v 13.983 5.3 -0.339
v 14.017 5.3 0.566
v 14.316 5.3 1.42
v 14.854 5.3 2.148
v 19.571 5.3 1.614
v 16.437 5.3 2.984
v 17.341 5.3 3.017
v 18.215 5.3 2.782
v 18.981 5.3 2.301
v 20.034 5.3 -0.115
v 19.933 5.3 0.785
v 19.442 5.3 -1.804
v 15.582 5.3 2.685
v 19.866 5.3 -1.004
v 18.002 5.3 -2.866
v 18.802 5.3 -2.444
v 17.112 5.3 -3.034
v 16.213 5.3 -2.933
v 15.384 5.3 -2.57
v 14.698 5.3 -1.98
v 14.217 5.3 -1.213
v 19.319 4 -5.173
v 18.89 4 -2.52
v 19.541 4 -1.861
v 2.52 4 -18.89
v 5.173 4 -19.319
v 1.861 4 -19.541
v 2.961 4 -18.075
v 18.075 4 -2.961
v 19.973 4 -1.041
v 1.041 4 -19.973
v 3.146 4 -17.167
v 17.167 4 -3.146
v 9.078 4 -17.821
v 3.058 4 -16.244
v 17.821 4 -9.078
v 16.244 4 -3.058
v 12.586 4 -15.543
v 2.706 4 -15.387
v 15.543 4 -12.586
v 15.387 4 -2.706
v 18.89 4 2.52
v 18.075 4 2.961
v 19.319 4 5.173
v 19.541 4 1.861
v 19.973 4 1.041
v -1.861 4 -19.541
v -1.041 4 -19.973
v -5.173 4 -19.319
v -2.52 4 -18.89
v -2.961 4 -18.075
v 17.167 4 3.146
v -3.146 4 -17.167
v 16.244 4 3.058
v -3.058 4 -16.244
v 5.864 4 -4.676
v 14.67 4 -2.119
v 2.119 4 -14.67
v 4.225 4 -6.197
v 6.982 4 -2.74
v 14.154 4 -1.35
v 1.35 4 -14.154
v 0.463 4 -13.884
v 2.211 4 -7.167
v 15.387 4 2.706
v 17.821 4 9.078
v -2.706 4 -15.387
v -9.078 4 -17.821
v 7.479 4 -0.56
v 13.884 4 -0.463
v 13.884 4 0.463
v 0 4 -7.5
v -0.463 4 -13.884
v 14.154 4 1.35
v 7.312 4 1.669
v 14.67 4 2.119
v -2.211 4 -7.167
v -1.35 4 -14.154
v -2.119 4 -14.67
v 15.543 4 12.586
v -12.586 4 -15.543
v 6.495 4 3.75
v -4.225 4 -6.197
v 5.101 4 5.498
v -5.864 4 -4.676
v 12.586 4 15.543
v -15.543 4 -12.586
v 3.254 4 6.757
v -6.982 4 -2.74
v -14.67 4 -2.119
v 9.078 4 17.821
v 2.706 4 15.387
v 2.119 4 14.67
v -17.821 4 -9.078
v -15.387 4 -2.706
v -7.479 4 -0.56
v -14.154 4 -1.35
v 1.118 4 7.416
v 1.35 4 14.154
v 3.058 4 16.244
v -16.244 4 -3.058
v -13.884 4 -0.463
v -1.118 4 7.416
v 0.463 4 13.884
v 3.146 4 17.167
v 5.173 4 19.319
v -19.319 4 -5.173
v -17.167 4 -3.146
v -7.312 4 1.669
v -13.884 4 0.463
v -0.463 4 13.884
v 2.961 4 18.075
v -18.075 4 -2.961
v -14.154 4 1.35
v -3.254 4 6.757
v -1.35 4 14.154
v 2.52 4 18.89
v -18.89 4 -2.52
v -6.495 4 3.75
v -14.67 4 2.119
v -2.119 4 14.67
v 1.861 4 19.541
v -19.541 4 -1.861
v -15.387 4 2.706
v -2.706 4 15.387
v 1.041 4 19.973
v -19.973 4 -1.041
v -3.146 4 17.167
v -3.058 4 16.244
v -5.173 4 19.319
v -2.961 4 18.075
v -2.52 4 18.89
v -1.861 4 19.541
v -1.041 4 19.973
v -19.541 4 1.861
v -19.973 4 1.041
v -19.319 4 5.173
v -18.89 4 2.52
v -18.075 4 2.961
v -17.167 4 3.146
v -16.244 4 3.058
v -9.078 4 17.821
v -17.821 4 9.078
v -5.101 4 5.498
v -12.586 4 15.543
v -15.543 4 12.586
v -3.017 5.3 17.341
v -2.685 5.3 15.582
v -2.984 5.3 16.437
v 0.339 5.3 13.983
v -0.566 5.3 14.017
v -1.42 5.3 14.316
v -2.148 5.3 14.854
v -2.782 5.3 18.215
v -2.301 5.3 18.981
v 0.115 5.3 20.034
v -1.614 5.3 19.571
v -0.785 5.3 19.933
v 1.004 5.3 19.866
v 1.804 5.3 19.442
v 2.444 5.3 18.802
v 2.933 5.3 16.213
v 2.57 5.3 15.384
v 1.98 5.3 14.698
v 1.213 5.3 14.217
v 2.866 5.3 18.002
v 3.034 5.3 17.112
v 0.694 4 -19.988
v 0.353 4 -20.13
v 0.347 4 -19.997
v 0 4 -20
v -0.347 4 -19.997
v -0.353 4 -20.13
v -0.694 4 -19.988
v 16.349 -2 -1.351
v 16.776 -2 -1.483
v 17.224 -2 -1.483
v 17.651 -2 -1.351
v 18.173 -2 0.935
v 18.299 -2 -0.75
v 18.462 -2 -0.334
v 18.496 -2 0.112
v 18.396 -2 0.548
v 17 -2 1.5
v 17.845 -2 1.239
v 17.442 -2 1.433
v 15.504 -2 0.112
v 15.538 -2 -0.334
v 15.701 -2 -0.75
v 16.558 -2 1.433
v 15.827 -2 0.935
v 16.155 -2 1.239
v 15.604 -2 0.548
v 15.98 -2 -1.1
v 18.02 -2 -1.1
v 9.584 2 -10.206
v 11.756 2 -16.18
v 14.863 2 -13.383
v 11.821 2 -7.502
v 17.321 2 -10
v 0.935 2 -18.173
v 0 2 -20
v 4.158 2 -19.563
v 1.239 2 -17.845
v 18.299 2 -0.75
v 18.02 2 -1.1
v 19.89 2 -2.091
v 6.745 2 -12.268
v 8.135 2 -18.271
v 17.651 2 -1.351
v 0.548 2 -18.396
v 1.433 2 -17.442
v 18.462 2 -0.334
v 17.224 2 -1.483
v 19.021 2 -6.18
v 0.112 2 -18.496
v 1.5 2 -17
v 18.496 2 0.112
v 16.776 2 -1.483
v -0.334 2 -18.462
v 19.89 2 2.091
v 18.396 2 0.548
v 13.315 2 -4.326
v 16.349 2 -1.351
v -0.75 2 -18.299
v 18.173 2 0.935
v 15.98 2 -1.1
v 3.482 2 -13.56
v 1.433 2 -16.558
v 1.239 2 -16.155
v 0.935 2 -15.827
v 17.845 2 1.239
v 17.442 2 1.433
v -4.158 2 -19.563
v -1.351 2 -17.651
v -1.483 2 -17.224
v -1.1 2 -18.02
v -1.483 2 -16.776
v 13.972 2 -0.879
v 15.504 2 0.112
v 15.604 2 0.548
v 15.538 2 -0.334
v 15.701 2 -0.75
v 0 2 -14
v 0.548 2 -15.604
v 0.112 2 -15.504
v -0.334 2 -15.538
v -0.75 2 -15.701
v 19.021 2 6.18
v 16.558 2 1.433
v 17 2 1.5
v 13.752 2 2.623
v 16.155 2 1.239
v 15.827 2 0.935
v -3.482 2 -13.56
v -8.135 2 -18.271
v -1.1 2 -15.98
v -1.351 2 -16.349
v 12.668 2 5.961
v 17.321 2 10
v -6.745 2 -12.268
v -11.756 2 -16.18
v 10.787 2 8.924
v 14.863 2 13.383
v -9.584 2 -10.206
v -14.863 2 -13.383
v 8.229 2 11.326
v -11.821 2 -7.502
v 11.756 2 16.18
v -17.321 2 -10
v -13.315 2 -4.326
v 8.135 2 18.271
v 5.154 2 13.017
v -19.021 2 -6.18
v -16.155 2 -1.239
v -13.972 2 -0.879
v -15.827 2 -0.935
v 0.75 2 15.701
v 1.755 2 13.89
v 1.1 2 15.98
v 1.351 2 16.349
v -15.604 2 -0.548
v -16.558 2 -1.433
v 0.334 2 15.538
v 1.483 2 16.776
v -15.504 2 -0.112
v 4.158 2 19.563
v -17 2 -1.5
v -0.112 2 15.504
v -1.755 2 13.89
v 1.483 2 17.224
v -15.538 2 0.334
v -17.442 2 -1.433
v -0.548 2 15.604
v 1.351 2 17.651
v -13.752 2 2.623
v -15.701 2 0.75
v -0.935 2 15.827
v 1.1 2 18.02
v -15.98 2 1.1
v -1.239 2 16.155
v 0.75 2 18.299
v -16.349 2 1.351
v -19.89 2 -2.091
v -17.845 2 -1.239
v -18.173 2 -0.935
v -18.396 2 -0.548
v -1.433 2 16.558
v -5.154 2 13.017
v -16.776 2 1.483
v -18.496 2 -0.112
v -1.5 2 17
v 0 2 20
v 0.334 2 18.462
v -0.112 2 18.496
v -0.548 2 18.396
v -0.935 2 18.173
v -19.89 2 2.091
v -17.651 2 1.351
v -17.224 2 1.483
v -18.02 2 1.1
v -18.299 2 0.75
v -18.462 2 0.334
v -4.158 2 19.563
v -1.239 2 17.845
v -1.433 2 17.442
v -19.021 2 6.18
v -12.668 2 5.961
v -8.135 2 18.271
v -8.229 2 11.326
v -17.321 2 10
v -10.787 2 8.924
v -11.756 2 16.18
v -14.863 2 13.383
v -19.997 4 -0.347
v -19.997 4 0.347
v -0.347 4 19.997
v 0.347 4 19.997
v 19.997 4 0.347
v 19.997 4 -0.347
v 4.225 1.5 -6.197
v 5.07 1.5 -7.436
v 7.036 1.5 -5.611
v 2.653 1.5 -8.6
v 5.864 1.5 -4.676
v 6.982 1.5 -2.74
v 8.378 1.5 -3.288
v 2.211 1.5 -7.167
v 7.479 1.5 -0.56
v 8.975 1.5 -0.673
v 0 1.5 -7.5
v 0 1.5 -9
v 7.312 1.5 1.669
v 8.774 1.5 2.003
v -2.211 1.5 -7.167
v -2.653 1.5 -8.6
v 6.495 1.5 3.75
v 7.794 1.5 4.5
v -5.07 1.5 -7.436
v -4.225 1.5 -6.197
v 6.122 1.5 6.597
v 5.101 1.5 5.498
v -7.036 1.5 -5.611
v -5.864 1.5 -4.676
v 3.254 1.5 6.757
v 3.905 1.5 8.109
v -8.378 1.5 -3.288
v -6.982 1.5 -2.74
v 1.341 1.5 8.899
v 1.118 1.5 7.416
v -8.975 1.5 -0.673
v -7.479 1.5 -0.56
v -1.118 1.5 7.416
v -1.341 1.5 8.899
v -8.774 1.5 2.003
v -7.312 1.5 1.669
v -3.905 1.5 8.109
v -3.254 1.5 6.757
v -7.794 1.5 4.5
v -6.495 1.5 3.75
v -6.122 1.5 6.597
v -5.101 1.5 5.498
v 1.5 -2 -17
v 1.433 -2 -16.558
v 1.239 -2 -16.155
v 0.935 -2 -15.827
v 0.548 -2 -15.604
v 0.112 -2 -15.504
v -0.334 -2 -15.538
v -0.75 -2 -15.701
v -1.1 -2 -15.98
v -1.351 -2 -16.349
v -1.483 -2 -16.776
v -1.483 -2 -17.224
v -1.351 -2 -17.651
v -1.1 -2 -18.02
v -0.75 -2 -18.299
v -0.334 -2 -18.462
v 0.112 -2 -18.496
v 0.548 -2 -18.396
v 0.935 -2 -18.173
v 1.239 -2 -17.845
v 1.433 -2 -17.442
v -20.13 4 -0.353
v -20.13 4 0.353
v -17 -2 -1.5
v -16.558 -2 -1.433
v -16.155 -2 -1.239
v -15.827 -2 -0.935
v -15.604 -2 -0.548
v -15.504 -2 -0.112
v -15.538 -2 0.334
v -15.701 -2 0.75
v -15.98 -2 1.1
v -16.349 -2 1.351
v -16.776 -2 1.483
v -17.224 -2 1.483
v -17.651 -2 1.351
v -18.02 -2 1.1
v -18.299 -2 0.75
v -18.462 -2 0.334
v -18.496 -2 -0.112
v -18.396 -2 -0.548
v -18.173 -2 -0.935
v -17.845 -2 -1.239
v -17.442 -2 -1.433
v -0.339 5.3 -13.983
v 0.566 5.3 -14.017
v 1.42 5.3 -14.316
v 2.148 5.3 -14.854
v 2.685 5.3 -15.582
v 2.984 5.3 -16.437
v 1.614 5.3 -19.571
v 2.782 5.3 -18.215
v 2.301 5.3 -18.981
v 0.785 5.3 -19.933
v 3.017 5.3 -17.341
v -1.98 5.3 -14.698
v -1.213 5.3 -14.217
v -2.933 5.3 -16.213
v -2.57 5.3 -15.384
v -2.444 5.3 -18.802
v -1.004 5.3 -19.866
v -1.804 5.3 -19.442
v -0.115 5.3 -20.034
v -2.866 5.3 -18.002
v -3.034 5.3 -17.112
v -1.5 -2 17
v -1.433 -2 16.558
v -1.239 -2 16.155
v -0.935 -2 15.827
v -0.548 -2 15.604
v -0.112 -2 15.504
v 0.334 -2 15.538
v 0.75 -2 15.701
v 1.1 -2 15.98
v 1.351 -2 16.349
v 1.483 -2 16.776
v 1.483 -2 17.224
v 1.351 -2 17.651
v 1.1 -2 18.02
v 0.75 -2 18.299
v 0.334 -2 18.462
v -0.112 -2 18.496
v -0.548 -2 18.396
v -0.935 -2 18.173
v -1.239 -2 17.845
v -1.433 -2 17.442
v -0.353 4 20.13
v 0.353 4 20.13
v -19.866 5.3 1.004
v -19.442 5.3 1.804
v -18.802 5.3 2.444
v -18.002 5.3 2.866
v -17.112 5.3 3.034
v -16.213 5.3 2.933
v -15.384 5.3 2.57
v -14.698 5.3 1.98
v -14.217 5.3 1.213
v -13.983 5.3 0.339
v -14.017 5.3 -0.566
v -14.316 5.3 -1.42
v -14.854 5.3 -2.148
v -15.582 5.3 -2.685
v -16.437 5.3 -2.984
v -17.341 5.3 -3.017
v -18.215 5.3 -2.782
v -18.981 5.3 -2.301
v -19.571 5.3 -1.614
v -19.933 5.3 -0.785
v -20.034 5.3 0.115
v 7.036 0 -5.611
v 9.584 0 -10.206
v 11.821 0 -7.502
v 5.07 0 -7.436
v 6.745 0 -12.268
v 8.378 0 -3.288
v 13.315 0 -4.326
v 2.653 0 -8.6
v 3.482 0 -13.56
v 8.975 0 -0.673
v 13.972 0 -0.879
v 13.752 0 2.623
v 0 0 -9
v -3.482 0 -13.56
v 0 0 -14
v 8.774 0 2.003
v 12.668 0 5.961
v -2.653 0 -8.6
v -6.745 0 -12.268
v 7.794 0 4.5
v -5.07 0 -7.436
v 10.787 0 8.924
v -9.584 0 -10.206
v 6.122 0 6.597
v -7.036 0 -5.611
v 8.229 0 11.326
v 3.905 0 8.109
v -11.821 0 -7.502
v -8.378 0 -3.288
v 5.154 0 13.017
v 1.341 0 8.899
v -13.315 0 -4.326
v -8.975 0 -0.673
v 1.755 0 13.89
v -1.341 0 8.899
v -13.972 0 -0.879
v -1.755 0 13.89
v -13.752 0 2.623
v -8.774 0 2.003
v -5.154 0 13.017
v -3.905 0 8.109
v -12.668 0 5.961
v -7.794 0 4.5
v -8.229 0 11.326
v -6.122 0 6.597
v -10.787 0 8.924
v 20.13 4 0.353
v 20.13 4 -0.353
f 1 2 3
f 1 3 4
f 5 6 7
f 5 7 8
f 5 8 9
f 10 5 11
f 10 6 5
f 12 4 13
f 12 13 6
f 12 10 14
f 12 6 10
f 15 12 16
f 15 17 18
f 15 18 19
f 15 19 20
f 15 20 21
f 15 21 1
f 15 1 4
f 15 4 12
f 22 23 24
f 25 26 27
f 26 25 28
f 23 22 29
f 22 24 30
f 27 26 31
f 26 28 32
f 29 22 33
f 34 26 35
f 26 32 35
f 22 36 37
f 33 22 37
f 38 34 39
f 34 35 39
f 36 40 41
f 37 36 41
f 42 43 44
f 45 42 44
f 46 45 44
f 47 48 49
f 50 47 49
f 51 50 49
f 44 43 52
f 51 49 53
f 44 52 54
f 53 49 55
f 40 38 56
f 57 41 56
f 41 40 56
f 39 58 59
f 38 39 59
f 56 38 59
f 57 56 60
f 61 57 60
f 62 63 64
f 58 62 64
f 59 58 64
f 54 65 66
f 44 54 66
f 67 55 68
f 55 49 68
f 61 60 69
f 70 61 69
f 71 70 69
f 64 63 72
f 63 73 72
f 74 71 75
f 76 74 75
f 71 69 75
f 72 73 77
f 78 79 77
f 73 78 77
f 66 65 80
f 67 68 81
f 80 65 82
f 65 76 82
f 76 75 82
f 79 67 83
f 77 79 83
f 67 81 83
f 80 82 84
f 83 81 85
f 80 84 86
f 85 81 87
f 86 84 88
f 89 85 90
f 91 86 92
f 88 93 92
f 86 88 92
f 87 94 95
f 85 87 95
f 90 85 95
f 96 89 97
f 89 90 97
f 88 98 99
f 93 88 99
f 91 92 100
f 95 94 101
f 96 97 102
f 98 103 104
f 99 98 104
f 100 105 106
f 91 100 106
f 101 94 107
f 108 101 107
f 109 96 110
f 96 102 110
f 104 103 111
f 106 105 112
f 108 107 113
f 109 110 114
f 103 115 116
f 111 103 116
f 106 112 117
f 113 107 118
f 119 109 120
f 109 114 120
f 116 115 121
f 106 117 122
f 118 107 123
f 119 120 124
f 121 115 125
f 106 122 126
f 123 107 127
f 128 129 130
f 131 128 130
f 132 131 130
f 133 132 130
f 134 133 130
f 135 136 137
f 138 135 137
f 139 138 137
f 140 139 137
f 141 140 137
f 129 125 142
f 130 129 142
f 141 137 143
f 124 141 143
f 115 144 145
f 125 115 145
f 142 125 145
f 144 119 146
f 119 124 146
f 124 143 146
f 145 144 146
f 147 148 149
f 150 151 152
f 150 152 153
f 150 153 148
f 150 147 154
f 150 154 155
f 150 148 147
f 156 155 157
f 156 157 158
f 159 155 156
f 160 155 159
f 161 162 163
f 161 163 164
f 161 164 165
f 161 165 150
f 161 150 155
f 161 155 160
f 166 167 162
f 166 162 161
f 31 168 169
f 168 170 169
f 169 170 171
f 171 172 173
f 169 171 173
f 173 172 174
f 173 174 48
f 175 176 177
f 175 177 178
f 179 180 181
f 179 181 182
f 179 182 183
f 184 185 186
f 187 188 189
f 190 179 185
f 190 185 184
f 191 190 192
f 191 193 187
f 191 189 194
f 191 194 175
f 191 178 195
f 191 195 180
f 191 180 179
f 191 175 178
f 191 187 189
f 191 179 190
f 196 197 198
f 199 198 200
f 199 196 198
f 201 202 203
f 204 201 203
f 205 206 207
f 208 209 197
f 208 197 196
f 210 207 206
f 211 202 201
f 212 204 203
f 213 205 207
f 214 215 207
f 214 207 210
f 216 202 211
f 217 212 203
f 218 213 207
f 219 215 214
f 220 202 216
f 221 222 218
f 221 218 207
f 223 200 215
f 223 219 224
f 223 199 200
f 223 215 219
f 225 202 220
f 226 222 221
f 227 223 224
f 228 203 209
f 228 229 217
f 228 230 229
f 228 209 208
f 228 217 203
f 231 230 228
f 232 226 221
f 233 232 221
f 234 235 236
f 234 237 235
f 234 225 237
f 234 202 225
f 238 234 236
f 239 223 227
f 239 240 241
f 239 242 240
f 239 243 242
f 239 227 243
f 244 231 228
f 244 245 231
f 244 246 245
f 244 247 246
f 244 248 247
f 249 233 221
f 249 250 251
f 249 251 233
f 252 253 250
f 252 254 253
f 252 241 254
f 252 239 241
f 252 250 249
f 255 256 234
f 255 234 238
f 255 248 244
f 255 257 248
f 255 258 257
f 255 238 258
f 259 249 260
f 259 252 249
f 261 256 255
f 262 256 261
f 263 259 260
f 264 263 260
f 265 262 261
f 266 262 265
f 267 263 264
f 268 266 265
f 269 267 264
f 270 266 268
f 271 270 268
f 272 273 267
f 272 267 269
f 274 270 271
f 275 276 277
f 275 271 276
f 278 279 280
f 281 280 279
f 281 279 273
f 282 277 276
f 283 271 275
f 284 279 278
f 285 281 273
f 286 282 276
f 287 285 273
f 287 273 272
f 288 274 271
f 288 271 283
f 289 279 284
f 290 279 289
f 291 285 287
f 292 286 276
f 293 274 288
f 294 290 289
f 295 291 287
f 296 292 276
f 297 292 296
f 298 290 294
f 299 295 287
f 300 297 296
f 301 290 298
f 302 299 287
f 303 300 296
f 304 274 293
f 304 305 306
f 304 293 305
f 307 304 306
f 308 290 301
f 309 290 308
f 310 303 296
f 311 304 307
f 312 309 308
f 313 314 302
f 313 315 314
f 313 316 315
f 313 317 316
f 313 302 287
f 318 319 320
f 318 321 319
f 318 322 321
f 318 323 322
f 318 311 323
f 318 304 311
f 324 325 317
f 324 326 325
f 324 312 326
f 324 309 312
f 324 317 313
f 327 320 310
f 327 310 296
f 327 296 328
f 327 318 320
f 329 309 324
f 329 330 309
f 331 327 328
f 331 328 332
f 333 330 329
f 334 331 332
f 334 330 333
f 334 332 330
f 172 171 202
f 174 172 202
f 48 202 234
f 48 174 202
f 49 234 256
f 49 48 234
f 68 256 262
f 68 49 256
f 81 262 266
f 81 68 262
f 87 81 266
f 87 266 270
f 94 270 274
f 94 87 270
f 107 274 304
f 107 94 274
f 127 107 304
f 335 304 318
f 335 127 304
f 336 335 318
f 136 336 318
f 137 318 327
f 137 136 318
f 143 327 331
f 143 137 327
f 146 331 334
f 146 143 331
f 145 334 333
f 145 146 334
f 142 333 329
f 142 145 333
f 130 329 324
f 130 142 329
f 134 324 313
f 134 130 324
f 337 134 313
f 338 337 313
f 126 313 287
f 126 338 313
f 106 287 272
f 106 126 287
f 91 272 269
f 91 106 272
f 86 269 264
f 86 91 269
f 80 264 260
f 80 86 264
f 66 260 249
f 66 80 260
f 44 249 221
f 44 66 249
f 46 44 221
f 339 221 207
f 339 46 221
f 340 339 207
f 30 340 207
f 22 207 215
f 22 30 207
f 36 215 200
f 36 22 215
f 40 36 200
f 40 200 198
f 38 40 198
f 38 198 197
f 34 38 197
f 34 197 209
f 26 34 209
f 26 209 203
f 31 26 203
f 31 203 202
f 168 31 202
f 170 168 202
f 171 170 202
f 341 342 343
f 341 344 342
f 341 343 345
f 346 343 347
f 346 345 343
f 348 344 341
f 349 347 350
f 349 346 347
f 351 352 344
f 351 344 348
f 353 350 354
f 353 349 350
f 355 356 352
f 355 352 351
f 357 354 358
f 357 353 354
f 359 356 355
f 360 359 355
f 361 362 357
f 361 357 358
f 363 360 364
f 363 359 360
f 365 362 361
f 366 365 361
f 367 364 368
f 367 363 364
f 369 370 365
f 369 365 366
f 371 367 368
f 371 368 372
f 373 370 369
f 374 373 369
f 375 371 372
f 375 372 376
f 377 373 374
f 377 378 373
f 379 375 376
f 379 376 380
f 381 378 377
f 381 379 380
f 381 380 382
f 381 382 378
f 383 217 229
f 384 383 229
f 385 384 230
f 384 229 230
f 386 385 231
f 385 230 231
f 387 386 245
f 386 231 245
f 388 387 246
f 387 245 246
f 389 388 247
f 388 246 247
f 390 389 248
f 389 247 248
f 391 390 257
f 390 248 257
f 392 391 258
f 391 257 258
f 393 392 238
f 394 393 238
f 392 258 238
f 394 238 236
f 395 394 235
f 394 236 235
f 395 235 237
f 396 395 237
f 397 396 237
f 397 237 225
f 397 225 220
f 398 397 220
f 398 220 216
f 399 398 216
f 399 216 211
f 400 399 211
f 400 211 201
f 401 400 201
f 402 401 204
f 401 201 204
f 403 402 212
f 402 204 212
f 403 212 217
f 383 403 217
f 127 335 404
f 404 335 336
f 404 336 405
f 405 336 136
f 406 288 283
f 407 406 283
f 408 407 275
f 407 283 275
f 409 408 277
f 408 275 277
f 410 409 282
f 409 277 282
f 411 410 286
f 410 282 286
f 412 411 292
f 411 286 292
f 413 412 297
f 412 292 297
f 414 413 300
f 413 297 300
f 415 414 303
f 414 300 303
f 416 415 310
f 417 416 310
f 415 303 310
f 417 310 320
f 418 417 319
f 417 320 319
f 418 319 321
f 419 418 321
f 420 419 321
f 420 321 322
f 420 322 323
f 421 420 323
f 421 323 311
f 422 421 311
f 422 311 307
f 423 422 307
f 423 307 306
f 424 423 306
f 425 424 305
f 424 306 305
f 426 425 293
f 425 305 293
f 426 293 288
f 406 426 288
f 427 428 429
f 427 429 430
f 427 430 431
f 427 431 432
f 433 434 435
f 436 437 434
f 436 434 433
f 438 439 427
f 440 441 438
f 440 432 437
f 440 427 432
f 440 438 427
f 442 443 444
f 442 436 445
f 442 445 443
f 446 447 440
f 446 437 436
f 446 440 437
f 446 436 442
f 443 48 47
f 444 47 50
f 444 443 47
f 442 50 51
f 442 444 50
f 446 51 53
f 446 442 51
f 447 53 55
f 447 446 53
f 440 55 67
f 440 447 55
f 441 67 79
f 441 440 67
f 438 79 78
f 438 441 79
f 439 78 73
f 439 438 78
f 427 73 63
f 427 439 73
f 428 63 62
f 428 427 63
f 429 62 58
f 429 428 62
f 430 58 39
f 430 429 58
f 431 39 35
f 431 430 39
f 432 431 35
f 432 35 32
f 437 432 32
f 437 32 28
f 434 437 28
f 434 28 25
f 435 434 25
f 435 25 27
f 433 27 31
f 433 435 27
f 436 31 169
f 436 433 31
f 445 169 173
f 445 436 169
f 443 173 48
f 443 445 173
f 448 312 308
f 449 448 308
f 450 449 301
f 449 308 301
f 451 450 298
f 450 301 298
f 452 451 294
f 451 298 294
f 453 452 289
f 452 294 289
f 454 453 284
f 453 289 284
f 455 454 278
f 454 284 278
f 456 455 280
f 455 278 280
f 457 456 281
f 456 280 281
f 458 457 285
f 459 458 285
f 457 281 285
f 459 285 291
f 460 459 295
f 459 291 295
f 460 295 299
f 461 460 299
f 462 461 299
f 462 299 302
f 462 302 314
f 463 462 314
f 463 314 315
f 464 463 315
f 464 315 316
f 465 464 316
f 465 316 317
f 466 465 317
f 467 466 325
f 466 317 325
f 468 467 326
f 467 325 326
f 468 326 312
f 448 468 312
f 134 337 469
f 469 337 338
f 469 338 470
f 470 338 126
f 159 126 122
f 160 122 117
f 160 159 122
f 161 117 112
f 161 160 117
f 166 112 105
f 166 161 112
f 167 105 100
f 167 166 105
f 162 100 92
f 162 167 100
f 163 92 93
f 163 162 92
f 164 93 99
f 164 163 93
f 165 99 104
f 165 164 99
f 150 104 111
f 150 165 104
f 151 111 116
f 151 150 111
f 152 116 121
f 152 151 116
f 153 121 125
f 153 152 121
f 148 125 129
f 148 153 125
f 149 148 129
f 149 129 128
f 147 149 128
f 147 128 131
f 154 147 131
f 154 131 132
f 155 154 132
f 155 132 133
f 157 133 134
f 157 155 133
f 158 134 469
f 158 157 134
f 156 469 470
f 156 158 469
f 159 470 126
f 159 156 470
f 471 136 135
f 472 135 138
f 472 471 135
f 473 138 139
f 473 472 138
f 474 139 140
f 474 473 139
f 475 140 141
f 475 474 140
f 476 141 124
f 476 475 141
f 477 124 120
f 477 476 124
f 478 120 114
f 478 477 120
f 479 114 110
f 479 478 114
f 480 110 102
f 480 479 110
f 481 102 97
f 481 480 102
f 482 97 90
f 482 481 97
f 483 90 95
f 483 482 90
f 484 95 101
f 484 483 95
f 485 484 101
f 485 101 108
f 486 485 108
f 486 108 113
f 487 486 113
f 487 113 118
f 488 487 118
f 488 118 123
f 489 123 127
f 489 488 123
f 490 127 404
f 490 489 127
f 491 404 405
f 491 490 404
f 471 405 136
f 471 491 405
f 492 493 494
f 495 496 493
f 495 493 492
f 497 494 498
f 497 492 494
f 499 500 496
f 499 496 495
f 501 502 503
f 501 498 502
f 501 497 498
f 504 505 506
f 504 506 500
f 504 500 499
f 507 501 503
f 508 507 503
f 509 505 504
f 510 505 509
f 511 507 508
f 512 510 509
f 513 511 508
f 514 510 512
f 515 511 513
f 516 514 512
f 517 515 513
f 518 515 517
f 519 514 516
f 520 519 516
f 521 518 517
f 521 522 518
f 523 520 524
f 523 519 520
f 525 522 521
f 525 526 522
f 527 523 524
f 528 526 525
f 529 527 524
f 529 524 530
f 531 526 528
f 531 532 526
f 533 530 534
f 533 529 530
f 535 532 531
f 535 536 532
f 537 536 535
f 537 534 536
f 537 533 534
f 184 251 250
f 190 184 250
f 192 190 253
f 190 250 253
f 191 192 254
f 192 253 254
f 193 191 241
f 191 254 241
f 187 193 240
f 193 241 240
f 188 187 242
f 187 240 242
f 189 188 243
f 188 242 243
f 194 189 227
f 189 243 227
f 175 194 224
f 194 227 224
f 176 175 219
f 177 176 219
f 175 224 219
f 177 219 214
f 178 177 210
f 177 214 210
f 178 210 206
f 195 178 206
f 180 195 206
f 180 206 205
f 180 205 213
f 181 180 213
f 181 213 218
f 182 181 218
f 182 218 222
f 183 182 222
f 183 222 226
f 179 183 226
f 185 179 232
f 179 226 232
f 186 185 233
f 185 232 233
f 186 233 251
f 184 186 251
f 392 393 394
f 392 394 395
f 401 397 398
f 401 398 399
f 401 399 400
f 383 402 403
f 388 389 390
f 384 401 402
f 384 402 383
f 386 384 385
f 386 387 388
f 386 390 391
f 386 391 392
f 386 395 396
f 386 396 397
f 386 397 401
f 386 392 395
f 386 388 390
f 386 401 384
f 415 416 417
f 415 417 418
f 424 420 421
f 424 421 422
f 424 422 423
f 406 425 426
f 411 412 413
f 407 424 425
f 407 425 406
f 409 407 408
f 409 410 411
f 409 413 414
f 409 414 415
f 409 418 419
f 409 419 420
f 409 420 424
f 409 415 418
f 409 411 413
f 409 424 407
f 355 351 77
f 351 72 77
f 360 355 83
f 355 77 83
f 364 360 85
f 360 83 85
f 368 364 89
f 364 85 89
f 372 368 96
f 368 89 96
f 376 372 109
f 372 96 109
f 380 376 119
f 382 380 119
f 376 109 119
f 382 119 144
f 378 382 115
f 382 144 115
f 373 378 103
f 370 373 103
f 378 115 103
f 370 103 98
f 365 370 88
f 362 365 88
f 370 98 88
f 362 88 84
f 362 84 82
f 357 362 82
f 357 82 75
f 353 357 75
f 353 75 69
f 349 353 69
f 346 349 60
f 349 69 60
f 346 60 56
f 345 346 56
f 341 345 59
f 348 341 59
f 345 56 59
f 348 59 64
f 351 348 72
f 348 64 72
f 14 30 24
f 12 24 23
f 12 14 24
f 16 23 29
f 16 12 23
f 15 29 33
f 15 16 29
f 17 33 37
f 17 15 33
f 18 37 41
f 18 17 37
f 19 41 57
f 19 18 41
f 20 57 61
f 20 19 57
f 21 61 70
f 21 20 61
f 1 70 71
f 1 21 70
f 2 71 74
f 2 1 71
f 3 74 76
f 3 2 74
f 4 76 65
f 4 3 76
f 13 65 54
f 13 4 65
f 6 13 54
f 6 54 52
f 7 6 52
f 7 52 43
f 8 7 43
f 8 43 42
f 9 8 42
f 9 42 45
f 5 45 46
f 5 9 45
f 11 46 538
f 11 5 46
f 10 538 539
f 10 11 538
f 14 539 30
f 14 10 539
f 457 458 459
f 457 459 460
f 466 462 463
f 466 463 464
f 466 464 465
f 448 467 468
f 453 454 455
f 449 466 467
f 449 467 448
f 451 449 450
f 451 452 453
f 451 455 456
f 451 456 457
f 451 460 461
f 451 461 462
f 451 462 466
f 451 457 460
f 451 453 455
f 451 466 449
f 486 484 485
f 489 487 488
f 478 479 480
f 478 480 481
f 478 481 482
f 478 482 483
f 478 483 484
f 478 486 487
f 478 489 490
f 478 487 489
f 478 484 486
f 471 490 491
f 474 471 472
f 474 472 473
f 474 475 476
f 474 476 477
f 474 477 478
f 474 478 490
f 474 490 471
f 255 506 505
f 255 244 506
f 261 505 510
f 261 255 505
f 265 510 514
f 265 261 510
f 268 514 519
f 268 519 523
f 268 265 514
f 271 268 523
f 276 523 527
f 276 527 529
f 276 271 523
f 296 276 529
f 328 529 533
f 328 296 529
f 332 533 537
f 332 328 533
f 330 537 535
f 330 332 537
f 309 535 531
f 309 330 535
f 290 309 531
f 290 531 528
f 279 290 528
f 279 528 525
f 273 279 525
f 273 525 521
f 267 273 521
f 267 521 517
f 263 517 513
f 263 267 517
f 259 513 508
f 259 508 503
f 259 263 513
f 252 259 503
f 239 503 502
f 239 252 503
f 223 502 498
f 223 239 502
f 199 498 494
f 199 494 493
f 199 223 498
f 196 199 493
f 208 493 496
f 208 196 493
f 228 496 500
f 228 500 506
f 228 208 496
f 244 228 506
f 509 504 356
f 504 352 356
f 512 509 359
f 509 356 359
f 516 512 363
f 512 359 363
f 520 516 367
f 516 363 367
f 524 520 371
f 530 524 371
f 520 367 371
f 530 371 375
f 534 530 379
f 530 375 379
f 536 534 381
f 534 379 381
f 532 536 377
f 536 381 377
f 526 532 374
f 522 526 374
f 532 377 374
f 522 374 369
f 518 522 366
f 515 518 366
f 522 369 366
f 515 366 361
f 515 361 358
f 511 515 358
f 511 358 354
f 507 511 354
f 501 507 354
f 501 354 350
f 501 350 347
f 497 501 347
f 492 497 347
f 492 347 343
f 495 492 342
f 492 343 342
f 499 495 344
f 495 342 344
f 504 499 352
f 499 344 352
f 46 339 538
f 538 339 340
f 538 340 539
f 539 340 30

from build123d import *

# Parameters (mm, degrees)
SKETCH1_W           = 12.5
SKETCH1_H           = 4
SKETCH2_W           = 6
SKETCH2_H           = 2
SKETCH2_W_2         = 1.5
SKETCH2_H_2         = 1.5
SKETCH3_R           = 3.15
BOSS_EXTRUDE1_DEPTH = 1.3
SKETCH4_R           = 1.5
BOSS_EXTRUDE2_DEPTH = 4
CIRPATTERN1_COUNT   = 4
CHAMFER1_SIZE       = 1.3
CHAMFER1_SIZE_2     = 0.113735263


with BuildPart() as part:
    # Sketch1 → Revolve1 (revolve)
    with BuildSketch(Plane.XY, mode=Mode.PRIVATE) as revolve1_sk:
        with Locations((13.75, 2)):
            Rectangle(SKETCH1_W, SKETCH1_H)
    revolve(revolve1_sk.sketch.rotate(Axis((0, -5.176379432, 0), (0, 1, 0)), 90), axis=Axis((0, -5.176379432, 0), (0, 1, 0)))

    # Sketch2 → Cut-Revolve1 (revolve, cut)
    with BuildSketch(Plane.XY, mode=Mode.PRIVATE) as cut_revolve1_sk:
        with Locations((17, 1)):
            Rectangle(SKETCH2_W, SKETCH2_H)
        with Locations((8.25, 0.75)):
            Rectangle(SKETCH2_W_2, SKETCH2_H_2)
    revolve(cut_revolve1_sk.sketch.rotate(Axis((0, -1.233398275, 0), (0, 1, 0)), 90), axis=Axis((0, -1.233398275, 0), (0, 1, 0)), mode=Mode.SUBTRACT)

    # Sketch3 → Boss-Extrude1 (add)
    with BuildSketch(Plane(origin=(0, 4, 0), x_dir=(1, 0, 0), z_dir=(0, 1, 0))):
        with Locations(Location((17, 0, 0), (0, 0, 19.305796893))):
            Circle(SKETCH3_R)
    boss_extrude1 = extrude(amount=BOSS_EXTRUDE1_DEPTH)

    # Sketch4 → Boss-Extrude2 (add)
    with BuildSketch(Plane.XZ.offset(-2)):
        with Locations(Location((17, 0, 0), (0, 0, 90))):
            Circle(SKETCH4_R)
    boss_extrude2 = extrude(amount=BOSS_EXTRUDE2_DEPTH)

    # CirPattern1: Boss-Extrude1, Boss-Extrude2 ×4 about axis
    cirpattern1_axis = Axis((0, 0, 0), (0, 1, 0))
    add([boss_extrude1.rotate(cirpattern1_axis, i * 360 / CIRPATTERN1_COUNT) for i in range(1, CIRPATTERN1_COUNT)])
    add([boss_extrude2.rotate(cirpattern1_axis, i * 360 / CIRPATTERN1_COUNT) for i in range(1, CIRPATTERN1_COUNT)])

    # Chamfer1
    # the kernel refuses this chamfer: 1.3, 0.113735263 mm, written as the material it takes off along each edge
    with BuildSketch(Plane(origin=(17, 5.3, 0), x_dir=(0.9437675070022826, 0, -0.3306098799592901), z_dir=(0.3306098799592901, 0, 0.9437675070022826))) as chamfer1_piece_1_section:
        Polygon((3.15, -CHAMFER1_SIZE), (3.15 - CHAMFER1_SIZE_2 * 0.99999999634, 0), (3.15, 0), align=None)
    chamfer1_piece_1 = revolve(axis=Axis((17, 5.3, 0), (0, 1, 0)), mode=Mode.PRIVATE)
    chamfer1_piece_1 = split(chamfer1_piece_1, bisect_by=Plane(origin=(14.070685383, 4, 1.026164121), z_dir=(0, 1, 0)), keep=Keep.TOP, mode=Mode.PRIVATE)
    add(chamfer1_piece_1, mode=Mode.SUBTRACT)
    with BuildSketch(Plane(origin=(0, 5.3, 17), x_dir=(0.3306098799592899, 0, 0.9437675070022828), z_dir=(-0.9437675070022828, 0, 0.3306098799592899))) as chamfer1_piece_2_section:
        Polygon((3.15, -CHAMFER1_SIZE), (3.15 - CHAMFER1_SIZE_2 * 0.99999999634, 0), (3.15, 0), align=None)
    chamfer1_piece_2 = revolve(axis=Axis((0, 5.3, 17), (0, 1, 0)), mode=Mode.PRIVATE)
    chamfer1_piece_2 = split(chamfer1_piece_2, bisect_by=Plane(origin=(-1.026164121, 4, 14.070685383), z_dir=(0, 1, 0)), keep=Keep.TOP, mode=Mode.PRIVATE)
    add(chamfer1_piece_2, mode=Mode.SUBTRACT)
    with BuildSketch(Plane(origin=(-17, 5.3, 0), x_dir=(-0.9437675070022828, 0, 0.33060987995929), z_dir=(-0.33060987995929, 0, -0.9437675070022828))) as chamfer1_piece_3_section:
        Polygon((3.15, -CHAMFER1_SIZE), (3.15 - CHAMFER1_SIZE_2 * 0.99999999634, 0), (3.15, 0), align=None)
    chamfer1_piece_3 = revolve(axis=Axis((-17, 5.3, 0), (0, 1, 0)), mode=Mode.PRIVATE)
    chamfer1_piece_3 = split(chamfer1_piece_3, bisect_by=Plane(origin=(-14.070685383, 4, -1.026164121), z_dir=(0, 1, 0)), keep=Keep.TOP, mode=Mode.PRIVATE)
    add(chamfer1_piece_3, mode=Mode.SUBTRACT)
    with BuildSketch(Plane(origin=(0, 5.3, -17), x_dir=(-0.33060987995929003, 0, -0.9437675070022828), z_dir=(0.9437675070022828, 0, -0.33060987995929003))) as chamfer1_piece_4_section:
        Polygon((3.15, -CHAMFER1_SIZE), (3.15 - CHAMFER1_SIZE_2 * 0.99999999634, 0), (3.15, 0), align=None)
    chamfer1_piece_4 = revolve(axis=Axis((0, 5.3, -17), (0, 1, 0)), mode=Mode.PRIVATE)
    chamfer1_piece_4 = split(chamfer1_piece_4, bisect_by=Plane(origin=(1.026164121, 4, -14.070685383), z_dir=(0, 1, 0)), keep=Keep.TOP, mode=Mode.PRIVATE)
    add(chamfer1_piece_4, mode=Mode.SUBTRACT)


solid = part.part
